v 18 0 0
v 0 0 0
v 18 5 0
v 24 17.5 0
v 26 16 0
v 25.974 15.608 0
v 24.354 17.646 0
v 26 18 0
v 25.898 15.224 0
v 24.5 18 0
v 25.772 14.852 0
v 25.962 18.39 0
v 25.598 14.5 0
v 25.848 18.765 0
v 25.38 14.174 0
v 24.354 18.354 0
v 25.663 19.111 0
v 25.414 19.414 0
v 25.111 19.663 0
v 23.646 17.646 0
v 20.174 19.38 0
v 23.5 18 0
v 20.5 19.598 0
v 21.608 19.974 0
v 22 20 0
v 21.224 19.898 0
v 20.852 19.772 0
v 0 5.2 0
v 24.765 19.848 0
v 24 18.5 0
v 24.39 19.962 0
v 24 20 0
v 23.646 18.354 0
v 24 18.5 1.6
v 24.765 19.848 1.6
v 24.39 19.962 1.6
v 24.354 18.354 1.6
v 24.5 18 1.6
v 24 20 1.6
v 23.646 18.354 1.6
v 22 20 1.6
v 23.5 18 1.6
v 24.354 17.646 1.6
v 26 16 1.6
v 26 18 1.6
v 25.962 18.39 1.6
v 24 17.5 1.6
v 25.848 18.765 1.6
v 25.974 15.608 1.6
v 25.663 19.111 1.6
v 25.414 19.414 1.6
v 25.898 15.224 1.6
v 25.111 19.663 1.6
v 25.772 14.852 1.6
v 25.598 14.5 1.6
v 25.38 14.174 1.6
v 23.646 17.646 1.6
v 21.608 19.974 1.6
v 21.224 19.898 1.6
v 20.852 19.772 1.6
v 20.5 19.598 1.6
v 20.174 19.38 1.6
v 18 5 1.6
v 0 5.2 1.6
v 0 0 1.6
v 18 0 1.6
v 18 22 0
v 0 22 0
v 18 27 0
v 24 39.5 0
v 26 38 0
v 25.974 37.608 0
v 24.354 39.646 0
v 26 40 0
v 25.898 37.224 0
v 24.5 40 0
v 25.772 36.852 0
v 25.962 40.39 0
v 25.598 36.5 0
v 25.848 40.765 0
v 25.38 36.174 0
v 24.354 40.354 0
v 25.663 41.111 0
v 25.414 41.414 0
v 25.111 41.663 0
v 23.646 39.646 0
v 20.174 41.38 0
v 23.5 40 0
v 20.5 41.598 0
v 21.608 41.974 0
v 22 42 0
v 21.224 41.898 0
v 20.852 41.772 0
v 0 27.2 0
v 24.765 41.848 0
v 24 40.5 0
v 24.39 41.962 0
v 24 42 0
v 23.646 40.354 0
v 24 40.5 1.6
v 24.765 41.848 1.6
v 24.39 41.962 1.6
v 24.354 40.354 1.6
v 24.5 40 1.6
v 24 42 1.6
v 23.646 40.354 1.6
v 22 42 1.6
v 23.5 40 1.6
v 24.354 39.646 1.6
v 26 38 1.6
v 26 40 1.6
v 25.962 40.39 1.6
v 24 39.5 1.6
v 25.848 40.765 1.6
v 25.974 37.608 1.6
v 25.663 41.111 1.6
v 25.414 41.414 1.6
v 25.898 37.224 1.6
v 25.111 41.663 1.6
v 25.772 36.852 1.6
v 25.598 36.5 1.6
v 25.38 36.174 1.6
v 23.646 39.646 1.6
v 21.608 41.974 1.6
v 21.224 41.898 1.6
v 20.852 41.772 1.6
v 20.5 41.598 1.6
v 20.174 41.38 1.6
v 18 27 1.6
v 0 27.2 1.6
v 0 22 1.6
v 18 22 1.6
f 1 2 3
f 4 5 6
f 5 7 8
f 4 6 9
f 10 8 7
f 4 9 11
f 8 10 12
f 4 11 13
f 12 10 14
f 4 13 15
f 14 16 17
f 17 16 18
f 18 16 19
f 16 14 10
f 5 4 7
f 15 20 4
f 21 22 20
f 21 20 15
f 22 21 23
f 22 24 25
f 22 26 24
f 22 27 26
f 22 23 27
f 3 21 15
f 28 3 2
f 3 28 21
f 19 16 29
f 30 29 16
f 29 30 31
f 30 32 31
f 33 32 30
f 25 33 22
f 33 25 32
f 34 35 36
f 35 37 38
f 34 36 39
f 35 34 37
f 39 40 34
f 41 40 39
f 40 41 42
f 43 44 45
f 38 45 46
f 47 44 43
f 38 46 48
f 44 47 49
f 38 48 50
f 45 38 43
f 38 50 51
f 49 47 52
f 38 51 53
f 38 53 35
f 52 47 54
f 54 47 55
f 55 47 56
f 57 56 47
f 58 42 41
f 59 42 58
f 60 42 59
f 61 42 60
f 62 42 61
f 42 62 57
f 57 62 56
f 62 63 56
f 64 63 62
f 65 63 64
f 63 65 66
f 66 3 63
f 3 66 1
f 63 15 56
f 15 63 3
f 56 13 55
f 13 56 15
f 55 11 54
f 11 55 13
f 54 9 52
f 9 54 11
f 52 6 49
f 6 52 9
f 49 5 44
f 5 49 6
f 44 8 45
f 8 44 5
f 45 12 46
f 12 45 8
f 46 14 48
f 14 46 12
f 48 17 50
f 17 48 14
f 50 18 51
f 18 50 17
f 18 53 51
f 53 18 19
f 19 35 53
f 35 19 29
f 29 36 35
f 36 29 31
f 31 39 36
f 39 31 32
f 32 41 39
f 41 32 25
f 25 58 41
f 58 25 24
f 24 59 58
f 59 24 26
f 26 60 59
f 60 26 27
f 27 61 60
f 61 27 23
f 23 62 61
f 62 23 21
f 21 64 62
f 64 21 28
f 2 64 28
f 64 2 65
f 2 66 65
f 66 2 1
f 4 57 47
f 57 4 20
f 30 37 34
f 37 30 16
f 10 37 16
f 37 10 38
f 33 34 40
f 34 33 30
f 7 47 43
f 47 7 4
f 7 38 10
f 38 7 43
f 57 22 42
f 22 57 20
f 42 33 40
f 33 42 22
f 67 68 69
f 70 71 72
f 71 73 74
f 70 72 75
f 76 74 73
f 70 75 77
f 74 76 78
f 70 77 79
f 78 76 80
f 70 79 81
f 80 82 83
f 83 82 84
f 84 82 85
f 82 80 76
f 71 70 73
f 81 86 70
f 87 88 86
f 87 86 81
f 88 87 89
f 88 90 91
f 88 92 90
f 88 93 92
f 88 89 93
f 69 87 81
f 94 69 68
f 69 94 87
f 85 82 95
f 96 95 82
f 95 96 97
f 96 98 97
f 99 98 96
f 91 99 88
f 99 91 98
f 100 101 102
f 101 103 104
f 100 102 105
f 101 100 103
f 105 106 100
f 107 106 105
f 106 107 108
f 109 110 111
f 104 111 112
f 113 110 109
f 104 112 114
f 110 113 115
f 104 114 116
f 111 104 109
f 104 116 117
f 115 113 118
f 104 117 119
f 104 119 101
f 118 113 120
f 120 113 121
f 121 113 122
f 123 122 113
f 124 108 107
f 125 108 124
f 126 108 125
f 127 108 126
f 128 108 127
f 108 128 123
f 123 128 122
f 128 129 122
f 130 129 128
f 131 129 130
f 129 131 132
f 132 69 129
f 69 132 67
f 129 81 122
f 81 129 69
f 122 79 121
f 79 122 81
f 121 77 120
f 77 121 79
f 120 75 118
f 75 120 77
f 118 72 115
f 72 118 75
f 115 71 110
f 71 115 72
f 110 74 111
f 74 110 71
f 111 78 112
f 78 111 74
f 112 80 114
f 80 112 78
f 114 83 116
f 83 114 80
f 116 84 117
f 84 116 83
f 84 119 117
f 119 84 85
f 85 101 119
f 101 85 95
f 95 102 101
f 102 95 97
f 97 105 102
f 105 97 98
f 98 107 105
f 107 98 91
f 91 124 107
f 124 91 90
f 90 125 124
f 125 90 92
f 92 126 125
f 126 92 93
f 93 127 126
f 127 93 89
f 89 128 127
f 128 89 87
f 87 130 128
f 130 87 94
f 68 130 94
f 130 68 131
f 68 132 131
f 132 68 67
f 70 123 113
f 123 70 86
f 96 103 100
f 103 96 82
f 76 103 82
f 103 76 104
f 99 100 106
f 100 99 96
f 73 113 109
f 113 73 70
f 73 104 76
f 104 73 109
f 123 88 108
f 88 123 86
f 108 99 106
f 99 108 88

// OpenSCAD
//$fn=60;
$fa=5;
$fs=.4;

horn();
translate([0,22,0]) horn();

module horn(){
    difference(){
        linear_extrude(height=1.6) union(){
            hull(){
                translate([0,5,0]) square([18,0.2]);
                translate([23,16,0]) circle(d=6);
                translate([24,18,0]) circle(d=4);
                translate([22,17,0]) circle(d=6);
            }
            square([18,5]);
        }
        translate([24,18,-5]) cylinder(h=10,d=1);
    }
}
